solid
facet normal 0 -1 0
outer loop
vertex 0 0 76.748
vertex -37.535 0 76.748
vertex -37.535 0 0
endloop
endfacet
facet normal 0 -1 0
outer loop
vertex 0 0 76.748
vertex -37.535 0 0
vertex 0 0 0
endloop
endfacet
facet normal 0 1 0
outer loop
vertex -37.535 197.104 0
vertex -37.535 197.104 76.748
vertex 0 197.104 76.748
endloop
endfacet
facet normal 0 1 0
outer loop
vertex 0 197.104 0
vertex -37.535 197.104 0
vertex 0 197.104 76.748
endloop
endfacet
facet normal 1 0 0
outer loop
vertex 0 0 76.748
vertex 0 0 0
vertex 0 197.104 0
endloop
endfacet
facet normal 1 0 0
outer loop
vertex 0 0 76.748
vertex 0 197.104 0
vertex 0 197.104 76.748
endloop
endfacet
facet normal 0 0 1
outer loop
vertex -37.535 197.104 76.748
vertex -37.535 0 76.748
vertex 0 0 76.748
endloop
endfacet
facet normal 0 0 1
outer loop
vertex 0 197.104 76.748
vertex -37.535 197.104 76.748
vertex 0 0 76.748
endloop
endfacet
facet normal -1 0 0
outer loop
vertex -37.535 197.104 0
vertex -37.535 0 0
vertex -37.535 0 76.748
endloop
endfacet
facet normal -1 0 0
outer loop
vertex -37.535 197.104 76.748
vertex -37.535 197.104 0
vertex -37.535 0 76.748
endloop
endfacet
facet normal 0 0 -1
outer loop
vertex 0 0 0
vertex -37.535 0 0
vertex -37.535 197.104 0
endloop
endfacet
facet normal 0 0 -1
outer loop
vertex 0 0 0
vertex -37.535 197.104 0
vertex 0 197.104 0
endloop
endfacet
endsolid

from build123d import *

# Parameters (mm, degrees)
F0_W     = 37.534952
F0_H     = 76.748446
F1_DEPTH = 197.104
F2_R     = 23.57647
F3_DEPTH = 196.342


with BuildPart() as f1:
    # F0 (on Front) → F1 (new body)
    with BuildSketch(Plane.XZ):
        with Locations((-18.767476, 38.374223)):
            Rectangle(F0_W, F0_H)
    extrude(amount=-F1_DEPTH)


with BuildPart() as f3:
    # F2 (on Front) → F3 (new body)
    with BuildSketch(Plane.XZ):
        with Locations((-66.800937, 83.592579)):
            Circle(F2_R)
    extrude(amount=-F3_DEPTH)


solid = f1.part
